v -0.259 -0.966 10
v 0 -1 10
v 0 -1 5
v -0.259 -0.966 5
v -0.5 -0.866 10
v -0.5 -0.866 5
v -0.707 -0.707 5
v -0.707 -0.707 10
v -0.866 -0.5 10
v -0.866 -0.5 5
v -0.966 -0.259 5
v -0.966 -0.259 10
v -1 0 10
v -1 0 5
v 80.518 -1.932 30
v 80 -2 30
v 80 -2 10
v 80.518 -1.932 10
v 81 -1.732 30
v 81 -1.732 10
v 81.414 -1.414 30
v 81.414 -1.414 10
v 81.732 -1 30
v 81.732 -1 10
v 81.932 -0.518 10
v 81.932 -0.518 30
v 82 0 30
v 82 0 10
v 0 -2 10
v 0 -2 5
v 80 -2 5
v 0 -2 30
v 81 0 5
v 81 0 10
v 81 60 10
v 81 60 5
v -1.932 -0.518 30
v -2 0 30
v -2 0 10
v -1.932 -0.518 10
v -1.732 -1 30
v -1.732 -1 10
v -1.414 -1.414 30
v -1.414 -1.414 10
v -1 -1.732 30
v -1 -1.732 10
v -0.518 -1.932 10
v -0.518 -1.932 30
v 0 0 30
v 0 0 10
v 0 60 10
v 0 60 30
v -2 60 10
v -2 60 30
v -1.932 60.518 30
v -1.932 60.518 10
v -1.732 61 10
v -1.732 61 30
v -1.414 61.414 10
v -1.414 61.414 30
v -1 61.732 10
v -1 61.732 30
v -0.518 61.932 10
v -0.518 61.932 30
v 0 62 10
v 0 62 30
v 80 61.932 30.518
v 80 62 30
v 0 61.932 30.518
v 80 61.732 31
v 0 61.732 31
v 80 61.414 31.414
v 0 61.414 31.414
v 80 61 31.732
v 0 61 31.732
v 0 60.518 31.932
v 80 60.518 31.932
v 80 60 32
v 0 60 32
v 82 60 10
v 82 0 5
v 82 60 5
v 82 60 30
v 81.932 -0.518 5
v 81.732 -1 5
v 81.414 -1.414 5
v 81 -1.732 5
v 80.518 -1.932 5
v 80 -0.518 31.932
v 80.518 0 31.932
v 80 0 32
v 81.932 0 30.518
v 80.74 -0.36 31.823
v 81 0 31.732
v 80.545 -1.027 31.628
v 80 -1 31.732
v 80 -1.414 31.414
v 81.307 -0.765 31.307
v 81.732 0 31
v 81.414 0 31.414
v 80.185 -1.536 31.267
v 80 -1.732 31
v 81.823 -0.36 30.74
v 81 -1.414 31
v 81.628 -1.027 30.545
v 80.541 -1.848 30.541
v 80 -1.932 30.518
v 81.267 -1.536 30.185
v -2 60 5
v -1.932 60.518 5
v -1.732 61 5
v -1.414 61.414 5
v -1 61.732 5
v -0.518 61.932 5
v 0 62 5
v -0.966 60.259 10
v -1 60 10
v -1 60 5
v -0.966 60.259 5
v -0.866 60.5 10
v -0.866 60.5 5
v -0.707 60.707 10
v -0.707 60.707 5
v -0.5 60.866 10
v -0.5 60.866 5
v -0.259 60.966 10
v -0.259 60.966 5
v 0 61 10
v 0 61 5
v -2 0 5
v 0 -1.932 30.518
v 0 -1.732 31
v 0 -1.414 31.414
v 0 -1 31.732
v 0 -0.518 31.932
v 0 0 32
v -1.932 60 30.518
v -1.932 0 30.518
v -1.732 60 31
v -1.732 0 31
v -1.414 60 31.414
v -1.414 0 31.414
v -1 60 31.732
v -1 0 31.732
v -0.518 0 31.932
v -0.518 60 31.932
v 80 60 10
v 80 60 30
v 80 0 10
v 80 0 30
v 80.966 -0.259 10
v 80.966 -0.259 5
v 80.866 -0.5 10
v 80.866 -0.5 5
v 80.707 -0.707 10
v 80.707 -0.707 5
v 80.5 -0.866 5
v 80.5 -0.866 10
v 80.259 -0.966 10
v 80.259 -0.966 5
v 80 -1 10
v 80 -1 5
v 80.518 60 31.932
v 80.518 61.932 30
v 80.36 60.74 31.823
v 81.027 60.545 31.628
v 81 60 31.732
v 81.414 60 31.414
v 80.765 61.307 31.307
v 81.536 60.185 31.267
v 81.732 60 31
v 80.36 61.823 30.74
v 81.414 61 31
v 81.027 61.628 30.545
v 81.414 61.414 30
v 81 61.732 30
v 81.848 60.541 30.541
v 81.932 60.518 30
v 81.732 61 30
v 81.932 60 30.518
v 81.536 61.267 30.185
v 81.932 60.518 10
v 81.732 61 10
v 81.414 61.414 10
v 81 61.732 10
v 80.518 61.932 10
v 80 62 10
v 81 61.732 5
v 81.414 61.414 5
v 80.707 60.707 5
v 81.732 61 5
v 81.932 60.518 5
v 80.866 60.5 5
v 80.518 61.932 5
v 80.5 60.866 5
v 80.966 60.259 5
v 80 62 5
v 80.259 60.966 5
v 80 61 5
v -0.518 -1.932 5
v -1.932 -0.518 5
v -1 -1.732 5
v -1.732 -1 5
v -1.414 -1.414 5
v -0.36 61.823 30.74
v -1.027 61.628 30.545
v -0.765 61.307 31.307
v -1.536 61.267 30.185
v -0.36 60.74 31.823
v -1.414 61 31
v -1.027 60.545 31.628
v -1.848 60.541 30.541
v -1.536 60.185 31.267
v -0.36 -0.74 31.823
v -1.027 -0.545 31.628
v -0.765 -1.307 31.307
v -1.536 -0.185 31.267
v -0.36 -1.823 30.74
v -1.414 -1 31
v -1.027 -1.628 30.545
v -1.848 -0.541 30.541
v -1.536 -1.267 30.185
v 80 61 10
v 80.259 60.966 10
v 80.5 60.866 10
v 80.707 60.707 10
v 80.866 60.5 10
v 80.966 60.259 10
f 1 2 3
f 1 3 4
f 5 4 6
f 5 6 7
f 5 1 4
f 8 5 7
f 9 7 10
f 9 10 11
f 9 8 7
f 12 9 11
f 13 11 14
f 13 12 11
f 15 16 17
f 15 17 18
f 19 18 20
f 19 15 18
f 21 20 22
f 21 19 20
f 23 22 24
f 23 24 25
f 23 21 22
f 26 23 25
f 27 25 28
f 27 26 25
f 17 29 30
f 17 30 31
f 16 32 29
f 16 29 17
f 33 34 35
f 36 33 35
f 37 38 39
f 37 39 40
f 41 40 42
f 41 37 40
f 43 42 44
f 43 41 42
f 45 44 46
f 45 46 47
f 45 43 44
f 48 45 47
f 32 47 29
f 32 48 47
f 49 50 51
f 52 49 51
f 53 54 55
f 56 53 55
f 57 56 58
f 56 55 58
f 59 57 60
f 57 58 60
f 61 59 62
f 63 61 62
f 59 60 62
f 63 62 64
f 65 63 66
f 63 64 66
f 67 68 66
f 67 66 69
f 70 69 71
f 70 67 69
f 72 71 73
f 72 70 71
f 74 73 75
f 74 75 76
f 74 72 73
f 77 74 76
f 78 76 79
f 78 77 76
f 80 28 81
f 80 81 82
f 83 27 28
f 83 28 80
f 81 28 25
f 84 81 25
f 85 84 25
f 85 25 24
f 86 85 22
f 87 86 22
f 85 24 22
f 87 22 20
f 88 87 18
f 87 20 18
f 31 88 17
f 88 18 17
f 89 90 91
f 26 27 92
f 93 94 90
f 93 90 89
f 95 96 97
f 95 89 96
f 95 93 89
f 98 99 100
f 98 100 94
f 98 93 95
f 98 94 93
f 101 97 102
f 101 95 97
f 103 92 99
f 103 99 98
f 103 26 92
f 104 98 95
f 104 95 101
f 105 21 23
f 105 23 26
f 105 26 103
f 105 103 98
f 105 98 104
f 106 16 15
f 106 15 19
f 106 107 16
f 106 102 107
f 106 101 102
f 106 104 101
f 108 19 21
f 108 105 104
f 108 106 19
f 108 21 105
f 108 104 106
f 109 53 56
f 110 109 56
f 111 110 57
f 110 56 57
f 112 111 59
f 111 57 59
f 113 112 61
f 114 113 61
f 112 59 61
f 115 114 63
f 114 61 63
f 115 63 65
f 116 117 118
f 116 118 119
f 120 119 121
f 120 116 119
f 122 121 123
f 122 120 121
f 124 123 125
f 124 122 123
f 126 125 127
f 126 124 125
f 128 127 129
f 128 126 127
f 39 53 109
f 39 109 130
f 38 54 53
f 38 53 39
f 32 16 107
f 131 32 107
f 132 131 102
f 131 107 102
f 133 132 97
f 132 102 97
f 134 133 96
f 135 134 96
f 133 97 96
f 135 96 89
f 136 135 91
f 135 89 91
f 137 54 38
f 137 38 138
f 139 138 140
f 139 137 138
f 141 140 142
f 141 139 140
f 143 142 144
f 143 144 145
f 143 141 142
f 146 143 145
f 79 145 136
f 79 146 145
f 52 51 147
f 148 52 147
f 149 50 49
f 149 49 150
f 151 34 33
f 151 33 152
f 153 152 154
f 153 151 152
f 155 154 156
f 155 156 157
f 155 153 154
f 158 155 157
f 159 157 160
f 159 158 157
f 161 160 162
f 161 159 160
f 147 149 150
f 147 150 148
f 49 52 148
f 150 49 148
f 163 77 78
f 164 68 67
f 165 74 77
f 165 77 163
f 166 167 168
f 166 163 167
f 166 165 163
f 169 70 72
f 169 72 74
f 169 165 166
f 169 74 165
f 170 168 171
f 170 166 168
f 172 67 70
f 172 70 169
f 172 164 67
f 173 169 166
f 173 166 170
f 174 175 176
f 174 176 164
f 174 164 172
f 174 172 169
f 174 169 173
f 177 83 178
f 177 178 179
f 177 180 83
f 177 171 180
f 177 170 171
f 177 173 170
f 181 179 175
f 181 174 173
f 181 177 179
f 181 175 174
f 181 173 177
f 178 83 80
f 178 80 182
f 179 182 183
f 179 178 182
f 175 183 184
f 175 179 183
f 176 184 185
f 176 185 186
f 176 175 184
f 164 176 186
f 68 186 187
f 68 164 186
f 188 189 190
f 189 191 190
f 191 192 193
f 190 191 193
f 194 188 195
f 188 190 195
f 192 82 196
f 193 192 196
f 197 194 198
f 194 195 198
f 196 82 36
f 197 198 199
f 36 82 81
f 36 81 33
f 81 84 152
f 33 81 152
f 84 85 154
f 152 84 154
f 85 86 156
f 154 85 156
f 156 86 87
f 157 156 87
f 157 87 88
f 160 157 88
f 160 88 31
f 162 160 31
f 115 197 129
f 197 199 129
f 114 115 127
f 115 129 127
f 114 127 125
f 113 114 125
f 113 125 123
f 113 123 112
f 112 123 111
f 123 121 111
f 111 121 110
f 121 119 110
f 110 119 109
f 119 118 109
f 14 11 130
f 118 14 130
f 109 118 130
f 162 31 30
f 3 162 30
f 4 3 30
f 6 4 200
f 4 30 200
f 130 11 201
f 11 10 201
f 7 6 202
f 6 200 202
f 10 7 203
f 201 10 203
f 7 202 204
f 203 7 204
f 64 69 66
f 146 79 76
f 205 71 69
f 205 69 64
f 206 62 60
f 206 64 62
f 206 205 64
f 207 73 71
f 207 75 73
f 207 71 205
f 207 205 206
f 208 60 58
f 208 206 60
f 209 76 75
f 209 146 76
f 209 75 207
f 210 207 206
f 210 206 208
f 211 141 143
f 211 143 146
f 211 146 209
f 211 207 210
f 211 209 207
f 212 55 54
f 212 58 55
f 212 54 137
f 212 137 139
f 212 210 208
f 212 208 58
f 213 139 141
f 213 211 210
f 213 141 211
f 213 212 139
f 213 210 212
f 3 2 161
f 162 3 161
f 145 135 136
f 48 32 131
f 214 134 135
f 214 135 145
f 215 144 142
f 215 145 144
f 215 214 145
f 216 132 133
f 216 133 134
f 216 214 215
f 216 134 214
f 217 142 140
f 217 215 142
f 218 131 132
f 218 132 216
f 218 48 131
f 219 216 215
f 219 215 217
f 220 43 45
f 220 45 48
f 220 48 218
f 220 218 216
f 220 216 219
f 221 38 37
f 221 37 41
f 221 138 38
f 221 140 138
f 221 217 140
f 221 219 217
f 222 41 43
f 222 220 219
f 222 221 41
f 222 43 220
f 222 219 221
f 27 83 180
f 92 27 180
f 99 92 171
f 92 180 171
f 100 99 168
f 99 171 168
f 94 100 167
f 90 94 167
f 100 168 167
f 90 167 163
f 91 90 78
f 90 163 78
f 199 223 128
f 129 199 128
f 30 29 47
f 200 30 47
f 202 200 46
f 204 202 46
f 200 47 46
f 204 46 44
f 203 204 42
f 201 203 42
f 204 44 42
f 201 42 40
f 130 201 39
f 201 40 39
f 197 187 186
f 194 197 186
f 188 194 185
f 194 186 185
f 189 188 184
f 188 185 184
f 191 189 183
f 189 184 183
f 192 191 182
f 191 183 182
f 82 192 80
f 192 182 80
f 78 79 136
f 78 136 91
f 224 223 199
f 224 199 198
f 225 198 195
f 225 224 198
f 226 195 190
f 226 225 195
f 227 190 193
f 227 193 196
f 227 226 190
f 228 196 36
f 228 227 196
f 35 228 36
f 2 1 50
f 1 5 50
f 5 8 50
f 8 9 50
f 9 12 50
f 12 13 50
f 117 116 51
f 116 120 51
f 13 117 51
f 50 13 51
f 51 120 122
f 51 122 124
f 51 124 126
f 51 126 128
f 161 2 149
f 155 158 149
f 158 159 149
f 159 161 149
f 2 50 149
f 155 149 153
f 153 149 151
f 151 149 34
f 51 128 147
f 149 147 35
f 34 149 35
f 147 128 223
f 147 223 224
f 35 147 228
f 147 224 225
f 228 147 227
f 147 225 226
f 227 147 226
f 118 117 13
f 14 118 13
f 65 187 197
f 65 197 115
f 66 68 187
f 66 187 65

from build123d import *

# Parameters (mm, degrees)
BOX001_W       = 80
BOX001_H       = 60
BOX001_DEPTH   = 20
THICKNESS001_T = 2
PAD001_DEPTH   = 5


with BuildPart() as part:
    # Box001 → Box001 (new body)
    with BuildSketch(Plane.XY.offset(10)):
        with Locations((40, 30)):
            Rectangle(BOX001_W, BOX001_H)
    extrude(amount=BOX001_DEPTH)

    # Thickness001
    thickness001_openings = [part.faces().sort_by_distance(p)[0] for p in [
        (40, 30, 10),
    ]]
    offset(amount=THICKNESS001_T, openings=thickness001_openings)

    # Sketch005 → Pad001 (new body)
    with BuildSketch(Plane(origin=(0, 0, 10), x_dir=(1, 0, 0), z_dir=(0, 0, -1))):
        with BuildLine():
            Line((0, 2), (80, 2))
            ThreePointArc((82, 0), (81.414214, 1.414214), (80, 2))
            Line((82, 0), (82, -60))
            ThreePointArc((80, -62), (81.414214, -61.414214), (82, -60))
            Line((80, -62), (0, -62))
            ThreePointArc((-2, -60), (-1.414214, -61.414214), (0, -62))
            Line((-2, -60), (-2, 0))
            ThreePointArc((0, 2), (-1.414214, 1.414214), (-2, 0))
        make_face()
        with BuildLine():
            Line((0, 1), (80, 1))
            ThreePointArc((81, 0), (80.707107, 0.707107), (80, 1))
            Line((81, 0), (81, -60))
            ThreePointArc((80, -61), (80.707107, -60.707107), (81, -60))
            Line((80, -61), (0, -61))
            ThreePointArc((-1, -60), (-0.707107, -60.707107), (0, -61))
            Line((-1, -60), (-1, 0))
            ThreePointArc((0, 1), (-0.707107, 0.707107), (-1, 0))
        make_face(mode=Mode.SUBTRACT)
    extrude(amount=PAD001_DEPTH)


solid = part.part
